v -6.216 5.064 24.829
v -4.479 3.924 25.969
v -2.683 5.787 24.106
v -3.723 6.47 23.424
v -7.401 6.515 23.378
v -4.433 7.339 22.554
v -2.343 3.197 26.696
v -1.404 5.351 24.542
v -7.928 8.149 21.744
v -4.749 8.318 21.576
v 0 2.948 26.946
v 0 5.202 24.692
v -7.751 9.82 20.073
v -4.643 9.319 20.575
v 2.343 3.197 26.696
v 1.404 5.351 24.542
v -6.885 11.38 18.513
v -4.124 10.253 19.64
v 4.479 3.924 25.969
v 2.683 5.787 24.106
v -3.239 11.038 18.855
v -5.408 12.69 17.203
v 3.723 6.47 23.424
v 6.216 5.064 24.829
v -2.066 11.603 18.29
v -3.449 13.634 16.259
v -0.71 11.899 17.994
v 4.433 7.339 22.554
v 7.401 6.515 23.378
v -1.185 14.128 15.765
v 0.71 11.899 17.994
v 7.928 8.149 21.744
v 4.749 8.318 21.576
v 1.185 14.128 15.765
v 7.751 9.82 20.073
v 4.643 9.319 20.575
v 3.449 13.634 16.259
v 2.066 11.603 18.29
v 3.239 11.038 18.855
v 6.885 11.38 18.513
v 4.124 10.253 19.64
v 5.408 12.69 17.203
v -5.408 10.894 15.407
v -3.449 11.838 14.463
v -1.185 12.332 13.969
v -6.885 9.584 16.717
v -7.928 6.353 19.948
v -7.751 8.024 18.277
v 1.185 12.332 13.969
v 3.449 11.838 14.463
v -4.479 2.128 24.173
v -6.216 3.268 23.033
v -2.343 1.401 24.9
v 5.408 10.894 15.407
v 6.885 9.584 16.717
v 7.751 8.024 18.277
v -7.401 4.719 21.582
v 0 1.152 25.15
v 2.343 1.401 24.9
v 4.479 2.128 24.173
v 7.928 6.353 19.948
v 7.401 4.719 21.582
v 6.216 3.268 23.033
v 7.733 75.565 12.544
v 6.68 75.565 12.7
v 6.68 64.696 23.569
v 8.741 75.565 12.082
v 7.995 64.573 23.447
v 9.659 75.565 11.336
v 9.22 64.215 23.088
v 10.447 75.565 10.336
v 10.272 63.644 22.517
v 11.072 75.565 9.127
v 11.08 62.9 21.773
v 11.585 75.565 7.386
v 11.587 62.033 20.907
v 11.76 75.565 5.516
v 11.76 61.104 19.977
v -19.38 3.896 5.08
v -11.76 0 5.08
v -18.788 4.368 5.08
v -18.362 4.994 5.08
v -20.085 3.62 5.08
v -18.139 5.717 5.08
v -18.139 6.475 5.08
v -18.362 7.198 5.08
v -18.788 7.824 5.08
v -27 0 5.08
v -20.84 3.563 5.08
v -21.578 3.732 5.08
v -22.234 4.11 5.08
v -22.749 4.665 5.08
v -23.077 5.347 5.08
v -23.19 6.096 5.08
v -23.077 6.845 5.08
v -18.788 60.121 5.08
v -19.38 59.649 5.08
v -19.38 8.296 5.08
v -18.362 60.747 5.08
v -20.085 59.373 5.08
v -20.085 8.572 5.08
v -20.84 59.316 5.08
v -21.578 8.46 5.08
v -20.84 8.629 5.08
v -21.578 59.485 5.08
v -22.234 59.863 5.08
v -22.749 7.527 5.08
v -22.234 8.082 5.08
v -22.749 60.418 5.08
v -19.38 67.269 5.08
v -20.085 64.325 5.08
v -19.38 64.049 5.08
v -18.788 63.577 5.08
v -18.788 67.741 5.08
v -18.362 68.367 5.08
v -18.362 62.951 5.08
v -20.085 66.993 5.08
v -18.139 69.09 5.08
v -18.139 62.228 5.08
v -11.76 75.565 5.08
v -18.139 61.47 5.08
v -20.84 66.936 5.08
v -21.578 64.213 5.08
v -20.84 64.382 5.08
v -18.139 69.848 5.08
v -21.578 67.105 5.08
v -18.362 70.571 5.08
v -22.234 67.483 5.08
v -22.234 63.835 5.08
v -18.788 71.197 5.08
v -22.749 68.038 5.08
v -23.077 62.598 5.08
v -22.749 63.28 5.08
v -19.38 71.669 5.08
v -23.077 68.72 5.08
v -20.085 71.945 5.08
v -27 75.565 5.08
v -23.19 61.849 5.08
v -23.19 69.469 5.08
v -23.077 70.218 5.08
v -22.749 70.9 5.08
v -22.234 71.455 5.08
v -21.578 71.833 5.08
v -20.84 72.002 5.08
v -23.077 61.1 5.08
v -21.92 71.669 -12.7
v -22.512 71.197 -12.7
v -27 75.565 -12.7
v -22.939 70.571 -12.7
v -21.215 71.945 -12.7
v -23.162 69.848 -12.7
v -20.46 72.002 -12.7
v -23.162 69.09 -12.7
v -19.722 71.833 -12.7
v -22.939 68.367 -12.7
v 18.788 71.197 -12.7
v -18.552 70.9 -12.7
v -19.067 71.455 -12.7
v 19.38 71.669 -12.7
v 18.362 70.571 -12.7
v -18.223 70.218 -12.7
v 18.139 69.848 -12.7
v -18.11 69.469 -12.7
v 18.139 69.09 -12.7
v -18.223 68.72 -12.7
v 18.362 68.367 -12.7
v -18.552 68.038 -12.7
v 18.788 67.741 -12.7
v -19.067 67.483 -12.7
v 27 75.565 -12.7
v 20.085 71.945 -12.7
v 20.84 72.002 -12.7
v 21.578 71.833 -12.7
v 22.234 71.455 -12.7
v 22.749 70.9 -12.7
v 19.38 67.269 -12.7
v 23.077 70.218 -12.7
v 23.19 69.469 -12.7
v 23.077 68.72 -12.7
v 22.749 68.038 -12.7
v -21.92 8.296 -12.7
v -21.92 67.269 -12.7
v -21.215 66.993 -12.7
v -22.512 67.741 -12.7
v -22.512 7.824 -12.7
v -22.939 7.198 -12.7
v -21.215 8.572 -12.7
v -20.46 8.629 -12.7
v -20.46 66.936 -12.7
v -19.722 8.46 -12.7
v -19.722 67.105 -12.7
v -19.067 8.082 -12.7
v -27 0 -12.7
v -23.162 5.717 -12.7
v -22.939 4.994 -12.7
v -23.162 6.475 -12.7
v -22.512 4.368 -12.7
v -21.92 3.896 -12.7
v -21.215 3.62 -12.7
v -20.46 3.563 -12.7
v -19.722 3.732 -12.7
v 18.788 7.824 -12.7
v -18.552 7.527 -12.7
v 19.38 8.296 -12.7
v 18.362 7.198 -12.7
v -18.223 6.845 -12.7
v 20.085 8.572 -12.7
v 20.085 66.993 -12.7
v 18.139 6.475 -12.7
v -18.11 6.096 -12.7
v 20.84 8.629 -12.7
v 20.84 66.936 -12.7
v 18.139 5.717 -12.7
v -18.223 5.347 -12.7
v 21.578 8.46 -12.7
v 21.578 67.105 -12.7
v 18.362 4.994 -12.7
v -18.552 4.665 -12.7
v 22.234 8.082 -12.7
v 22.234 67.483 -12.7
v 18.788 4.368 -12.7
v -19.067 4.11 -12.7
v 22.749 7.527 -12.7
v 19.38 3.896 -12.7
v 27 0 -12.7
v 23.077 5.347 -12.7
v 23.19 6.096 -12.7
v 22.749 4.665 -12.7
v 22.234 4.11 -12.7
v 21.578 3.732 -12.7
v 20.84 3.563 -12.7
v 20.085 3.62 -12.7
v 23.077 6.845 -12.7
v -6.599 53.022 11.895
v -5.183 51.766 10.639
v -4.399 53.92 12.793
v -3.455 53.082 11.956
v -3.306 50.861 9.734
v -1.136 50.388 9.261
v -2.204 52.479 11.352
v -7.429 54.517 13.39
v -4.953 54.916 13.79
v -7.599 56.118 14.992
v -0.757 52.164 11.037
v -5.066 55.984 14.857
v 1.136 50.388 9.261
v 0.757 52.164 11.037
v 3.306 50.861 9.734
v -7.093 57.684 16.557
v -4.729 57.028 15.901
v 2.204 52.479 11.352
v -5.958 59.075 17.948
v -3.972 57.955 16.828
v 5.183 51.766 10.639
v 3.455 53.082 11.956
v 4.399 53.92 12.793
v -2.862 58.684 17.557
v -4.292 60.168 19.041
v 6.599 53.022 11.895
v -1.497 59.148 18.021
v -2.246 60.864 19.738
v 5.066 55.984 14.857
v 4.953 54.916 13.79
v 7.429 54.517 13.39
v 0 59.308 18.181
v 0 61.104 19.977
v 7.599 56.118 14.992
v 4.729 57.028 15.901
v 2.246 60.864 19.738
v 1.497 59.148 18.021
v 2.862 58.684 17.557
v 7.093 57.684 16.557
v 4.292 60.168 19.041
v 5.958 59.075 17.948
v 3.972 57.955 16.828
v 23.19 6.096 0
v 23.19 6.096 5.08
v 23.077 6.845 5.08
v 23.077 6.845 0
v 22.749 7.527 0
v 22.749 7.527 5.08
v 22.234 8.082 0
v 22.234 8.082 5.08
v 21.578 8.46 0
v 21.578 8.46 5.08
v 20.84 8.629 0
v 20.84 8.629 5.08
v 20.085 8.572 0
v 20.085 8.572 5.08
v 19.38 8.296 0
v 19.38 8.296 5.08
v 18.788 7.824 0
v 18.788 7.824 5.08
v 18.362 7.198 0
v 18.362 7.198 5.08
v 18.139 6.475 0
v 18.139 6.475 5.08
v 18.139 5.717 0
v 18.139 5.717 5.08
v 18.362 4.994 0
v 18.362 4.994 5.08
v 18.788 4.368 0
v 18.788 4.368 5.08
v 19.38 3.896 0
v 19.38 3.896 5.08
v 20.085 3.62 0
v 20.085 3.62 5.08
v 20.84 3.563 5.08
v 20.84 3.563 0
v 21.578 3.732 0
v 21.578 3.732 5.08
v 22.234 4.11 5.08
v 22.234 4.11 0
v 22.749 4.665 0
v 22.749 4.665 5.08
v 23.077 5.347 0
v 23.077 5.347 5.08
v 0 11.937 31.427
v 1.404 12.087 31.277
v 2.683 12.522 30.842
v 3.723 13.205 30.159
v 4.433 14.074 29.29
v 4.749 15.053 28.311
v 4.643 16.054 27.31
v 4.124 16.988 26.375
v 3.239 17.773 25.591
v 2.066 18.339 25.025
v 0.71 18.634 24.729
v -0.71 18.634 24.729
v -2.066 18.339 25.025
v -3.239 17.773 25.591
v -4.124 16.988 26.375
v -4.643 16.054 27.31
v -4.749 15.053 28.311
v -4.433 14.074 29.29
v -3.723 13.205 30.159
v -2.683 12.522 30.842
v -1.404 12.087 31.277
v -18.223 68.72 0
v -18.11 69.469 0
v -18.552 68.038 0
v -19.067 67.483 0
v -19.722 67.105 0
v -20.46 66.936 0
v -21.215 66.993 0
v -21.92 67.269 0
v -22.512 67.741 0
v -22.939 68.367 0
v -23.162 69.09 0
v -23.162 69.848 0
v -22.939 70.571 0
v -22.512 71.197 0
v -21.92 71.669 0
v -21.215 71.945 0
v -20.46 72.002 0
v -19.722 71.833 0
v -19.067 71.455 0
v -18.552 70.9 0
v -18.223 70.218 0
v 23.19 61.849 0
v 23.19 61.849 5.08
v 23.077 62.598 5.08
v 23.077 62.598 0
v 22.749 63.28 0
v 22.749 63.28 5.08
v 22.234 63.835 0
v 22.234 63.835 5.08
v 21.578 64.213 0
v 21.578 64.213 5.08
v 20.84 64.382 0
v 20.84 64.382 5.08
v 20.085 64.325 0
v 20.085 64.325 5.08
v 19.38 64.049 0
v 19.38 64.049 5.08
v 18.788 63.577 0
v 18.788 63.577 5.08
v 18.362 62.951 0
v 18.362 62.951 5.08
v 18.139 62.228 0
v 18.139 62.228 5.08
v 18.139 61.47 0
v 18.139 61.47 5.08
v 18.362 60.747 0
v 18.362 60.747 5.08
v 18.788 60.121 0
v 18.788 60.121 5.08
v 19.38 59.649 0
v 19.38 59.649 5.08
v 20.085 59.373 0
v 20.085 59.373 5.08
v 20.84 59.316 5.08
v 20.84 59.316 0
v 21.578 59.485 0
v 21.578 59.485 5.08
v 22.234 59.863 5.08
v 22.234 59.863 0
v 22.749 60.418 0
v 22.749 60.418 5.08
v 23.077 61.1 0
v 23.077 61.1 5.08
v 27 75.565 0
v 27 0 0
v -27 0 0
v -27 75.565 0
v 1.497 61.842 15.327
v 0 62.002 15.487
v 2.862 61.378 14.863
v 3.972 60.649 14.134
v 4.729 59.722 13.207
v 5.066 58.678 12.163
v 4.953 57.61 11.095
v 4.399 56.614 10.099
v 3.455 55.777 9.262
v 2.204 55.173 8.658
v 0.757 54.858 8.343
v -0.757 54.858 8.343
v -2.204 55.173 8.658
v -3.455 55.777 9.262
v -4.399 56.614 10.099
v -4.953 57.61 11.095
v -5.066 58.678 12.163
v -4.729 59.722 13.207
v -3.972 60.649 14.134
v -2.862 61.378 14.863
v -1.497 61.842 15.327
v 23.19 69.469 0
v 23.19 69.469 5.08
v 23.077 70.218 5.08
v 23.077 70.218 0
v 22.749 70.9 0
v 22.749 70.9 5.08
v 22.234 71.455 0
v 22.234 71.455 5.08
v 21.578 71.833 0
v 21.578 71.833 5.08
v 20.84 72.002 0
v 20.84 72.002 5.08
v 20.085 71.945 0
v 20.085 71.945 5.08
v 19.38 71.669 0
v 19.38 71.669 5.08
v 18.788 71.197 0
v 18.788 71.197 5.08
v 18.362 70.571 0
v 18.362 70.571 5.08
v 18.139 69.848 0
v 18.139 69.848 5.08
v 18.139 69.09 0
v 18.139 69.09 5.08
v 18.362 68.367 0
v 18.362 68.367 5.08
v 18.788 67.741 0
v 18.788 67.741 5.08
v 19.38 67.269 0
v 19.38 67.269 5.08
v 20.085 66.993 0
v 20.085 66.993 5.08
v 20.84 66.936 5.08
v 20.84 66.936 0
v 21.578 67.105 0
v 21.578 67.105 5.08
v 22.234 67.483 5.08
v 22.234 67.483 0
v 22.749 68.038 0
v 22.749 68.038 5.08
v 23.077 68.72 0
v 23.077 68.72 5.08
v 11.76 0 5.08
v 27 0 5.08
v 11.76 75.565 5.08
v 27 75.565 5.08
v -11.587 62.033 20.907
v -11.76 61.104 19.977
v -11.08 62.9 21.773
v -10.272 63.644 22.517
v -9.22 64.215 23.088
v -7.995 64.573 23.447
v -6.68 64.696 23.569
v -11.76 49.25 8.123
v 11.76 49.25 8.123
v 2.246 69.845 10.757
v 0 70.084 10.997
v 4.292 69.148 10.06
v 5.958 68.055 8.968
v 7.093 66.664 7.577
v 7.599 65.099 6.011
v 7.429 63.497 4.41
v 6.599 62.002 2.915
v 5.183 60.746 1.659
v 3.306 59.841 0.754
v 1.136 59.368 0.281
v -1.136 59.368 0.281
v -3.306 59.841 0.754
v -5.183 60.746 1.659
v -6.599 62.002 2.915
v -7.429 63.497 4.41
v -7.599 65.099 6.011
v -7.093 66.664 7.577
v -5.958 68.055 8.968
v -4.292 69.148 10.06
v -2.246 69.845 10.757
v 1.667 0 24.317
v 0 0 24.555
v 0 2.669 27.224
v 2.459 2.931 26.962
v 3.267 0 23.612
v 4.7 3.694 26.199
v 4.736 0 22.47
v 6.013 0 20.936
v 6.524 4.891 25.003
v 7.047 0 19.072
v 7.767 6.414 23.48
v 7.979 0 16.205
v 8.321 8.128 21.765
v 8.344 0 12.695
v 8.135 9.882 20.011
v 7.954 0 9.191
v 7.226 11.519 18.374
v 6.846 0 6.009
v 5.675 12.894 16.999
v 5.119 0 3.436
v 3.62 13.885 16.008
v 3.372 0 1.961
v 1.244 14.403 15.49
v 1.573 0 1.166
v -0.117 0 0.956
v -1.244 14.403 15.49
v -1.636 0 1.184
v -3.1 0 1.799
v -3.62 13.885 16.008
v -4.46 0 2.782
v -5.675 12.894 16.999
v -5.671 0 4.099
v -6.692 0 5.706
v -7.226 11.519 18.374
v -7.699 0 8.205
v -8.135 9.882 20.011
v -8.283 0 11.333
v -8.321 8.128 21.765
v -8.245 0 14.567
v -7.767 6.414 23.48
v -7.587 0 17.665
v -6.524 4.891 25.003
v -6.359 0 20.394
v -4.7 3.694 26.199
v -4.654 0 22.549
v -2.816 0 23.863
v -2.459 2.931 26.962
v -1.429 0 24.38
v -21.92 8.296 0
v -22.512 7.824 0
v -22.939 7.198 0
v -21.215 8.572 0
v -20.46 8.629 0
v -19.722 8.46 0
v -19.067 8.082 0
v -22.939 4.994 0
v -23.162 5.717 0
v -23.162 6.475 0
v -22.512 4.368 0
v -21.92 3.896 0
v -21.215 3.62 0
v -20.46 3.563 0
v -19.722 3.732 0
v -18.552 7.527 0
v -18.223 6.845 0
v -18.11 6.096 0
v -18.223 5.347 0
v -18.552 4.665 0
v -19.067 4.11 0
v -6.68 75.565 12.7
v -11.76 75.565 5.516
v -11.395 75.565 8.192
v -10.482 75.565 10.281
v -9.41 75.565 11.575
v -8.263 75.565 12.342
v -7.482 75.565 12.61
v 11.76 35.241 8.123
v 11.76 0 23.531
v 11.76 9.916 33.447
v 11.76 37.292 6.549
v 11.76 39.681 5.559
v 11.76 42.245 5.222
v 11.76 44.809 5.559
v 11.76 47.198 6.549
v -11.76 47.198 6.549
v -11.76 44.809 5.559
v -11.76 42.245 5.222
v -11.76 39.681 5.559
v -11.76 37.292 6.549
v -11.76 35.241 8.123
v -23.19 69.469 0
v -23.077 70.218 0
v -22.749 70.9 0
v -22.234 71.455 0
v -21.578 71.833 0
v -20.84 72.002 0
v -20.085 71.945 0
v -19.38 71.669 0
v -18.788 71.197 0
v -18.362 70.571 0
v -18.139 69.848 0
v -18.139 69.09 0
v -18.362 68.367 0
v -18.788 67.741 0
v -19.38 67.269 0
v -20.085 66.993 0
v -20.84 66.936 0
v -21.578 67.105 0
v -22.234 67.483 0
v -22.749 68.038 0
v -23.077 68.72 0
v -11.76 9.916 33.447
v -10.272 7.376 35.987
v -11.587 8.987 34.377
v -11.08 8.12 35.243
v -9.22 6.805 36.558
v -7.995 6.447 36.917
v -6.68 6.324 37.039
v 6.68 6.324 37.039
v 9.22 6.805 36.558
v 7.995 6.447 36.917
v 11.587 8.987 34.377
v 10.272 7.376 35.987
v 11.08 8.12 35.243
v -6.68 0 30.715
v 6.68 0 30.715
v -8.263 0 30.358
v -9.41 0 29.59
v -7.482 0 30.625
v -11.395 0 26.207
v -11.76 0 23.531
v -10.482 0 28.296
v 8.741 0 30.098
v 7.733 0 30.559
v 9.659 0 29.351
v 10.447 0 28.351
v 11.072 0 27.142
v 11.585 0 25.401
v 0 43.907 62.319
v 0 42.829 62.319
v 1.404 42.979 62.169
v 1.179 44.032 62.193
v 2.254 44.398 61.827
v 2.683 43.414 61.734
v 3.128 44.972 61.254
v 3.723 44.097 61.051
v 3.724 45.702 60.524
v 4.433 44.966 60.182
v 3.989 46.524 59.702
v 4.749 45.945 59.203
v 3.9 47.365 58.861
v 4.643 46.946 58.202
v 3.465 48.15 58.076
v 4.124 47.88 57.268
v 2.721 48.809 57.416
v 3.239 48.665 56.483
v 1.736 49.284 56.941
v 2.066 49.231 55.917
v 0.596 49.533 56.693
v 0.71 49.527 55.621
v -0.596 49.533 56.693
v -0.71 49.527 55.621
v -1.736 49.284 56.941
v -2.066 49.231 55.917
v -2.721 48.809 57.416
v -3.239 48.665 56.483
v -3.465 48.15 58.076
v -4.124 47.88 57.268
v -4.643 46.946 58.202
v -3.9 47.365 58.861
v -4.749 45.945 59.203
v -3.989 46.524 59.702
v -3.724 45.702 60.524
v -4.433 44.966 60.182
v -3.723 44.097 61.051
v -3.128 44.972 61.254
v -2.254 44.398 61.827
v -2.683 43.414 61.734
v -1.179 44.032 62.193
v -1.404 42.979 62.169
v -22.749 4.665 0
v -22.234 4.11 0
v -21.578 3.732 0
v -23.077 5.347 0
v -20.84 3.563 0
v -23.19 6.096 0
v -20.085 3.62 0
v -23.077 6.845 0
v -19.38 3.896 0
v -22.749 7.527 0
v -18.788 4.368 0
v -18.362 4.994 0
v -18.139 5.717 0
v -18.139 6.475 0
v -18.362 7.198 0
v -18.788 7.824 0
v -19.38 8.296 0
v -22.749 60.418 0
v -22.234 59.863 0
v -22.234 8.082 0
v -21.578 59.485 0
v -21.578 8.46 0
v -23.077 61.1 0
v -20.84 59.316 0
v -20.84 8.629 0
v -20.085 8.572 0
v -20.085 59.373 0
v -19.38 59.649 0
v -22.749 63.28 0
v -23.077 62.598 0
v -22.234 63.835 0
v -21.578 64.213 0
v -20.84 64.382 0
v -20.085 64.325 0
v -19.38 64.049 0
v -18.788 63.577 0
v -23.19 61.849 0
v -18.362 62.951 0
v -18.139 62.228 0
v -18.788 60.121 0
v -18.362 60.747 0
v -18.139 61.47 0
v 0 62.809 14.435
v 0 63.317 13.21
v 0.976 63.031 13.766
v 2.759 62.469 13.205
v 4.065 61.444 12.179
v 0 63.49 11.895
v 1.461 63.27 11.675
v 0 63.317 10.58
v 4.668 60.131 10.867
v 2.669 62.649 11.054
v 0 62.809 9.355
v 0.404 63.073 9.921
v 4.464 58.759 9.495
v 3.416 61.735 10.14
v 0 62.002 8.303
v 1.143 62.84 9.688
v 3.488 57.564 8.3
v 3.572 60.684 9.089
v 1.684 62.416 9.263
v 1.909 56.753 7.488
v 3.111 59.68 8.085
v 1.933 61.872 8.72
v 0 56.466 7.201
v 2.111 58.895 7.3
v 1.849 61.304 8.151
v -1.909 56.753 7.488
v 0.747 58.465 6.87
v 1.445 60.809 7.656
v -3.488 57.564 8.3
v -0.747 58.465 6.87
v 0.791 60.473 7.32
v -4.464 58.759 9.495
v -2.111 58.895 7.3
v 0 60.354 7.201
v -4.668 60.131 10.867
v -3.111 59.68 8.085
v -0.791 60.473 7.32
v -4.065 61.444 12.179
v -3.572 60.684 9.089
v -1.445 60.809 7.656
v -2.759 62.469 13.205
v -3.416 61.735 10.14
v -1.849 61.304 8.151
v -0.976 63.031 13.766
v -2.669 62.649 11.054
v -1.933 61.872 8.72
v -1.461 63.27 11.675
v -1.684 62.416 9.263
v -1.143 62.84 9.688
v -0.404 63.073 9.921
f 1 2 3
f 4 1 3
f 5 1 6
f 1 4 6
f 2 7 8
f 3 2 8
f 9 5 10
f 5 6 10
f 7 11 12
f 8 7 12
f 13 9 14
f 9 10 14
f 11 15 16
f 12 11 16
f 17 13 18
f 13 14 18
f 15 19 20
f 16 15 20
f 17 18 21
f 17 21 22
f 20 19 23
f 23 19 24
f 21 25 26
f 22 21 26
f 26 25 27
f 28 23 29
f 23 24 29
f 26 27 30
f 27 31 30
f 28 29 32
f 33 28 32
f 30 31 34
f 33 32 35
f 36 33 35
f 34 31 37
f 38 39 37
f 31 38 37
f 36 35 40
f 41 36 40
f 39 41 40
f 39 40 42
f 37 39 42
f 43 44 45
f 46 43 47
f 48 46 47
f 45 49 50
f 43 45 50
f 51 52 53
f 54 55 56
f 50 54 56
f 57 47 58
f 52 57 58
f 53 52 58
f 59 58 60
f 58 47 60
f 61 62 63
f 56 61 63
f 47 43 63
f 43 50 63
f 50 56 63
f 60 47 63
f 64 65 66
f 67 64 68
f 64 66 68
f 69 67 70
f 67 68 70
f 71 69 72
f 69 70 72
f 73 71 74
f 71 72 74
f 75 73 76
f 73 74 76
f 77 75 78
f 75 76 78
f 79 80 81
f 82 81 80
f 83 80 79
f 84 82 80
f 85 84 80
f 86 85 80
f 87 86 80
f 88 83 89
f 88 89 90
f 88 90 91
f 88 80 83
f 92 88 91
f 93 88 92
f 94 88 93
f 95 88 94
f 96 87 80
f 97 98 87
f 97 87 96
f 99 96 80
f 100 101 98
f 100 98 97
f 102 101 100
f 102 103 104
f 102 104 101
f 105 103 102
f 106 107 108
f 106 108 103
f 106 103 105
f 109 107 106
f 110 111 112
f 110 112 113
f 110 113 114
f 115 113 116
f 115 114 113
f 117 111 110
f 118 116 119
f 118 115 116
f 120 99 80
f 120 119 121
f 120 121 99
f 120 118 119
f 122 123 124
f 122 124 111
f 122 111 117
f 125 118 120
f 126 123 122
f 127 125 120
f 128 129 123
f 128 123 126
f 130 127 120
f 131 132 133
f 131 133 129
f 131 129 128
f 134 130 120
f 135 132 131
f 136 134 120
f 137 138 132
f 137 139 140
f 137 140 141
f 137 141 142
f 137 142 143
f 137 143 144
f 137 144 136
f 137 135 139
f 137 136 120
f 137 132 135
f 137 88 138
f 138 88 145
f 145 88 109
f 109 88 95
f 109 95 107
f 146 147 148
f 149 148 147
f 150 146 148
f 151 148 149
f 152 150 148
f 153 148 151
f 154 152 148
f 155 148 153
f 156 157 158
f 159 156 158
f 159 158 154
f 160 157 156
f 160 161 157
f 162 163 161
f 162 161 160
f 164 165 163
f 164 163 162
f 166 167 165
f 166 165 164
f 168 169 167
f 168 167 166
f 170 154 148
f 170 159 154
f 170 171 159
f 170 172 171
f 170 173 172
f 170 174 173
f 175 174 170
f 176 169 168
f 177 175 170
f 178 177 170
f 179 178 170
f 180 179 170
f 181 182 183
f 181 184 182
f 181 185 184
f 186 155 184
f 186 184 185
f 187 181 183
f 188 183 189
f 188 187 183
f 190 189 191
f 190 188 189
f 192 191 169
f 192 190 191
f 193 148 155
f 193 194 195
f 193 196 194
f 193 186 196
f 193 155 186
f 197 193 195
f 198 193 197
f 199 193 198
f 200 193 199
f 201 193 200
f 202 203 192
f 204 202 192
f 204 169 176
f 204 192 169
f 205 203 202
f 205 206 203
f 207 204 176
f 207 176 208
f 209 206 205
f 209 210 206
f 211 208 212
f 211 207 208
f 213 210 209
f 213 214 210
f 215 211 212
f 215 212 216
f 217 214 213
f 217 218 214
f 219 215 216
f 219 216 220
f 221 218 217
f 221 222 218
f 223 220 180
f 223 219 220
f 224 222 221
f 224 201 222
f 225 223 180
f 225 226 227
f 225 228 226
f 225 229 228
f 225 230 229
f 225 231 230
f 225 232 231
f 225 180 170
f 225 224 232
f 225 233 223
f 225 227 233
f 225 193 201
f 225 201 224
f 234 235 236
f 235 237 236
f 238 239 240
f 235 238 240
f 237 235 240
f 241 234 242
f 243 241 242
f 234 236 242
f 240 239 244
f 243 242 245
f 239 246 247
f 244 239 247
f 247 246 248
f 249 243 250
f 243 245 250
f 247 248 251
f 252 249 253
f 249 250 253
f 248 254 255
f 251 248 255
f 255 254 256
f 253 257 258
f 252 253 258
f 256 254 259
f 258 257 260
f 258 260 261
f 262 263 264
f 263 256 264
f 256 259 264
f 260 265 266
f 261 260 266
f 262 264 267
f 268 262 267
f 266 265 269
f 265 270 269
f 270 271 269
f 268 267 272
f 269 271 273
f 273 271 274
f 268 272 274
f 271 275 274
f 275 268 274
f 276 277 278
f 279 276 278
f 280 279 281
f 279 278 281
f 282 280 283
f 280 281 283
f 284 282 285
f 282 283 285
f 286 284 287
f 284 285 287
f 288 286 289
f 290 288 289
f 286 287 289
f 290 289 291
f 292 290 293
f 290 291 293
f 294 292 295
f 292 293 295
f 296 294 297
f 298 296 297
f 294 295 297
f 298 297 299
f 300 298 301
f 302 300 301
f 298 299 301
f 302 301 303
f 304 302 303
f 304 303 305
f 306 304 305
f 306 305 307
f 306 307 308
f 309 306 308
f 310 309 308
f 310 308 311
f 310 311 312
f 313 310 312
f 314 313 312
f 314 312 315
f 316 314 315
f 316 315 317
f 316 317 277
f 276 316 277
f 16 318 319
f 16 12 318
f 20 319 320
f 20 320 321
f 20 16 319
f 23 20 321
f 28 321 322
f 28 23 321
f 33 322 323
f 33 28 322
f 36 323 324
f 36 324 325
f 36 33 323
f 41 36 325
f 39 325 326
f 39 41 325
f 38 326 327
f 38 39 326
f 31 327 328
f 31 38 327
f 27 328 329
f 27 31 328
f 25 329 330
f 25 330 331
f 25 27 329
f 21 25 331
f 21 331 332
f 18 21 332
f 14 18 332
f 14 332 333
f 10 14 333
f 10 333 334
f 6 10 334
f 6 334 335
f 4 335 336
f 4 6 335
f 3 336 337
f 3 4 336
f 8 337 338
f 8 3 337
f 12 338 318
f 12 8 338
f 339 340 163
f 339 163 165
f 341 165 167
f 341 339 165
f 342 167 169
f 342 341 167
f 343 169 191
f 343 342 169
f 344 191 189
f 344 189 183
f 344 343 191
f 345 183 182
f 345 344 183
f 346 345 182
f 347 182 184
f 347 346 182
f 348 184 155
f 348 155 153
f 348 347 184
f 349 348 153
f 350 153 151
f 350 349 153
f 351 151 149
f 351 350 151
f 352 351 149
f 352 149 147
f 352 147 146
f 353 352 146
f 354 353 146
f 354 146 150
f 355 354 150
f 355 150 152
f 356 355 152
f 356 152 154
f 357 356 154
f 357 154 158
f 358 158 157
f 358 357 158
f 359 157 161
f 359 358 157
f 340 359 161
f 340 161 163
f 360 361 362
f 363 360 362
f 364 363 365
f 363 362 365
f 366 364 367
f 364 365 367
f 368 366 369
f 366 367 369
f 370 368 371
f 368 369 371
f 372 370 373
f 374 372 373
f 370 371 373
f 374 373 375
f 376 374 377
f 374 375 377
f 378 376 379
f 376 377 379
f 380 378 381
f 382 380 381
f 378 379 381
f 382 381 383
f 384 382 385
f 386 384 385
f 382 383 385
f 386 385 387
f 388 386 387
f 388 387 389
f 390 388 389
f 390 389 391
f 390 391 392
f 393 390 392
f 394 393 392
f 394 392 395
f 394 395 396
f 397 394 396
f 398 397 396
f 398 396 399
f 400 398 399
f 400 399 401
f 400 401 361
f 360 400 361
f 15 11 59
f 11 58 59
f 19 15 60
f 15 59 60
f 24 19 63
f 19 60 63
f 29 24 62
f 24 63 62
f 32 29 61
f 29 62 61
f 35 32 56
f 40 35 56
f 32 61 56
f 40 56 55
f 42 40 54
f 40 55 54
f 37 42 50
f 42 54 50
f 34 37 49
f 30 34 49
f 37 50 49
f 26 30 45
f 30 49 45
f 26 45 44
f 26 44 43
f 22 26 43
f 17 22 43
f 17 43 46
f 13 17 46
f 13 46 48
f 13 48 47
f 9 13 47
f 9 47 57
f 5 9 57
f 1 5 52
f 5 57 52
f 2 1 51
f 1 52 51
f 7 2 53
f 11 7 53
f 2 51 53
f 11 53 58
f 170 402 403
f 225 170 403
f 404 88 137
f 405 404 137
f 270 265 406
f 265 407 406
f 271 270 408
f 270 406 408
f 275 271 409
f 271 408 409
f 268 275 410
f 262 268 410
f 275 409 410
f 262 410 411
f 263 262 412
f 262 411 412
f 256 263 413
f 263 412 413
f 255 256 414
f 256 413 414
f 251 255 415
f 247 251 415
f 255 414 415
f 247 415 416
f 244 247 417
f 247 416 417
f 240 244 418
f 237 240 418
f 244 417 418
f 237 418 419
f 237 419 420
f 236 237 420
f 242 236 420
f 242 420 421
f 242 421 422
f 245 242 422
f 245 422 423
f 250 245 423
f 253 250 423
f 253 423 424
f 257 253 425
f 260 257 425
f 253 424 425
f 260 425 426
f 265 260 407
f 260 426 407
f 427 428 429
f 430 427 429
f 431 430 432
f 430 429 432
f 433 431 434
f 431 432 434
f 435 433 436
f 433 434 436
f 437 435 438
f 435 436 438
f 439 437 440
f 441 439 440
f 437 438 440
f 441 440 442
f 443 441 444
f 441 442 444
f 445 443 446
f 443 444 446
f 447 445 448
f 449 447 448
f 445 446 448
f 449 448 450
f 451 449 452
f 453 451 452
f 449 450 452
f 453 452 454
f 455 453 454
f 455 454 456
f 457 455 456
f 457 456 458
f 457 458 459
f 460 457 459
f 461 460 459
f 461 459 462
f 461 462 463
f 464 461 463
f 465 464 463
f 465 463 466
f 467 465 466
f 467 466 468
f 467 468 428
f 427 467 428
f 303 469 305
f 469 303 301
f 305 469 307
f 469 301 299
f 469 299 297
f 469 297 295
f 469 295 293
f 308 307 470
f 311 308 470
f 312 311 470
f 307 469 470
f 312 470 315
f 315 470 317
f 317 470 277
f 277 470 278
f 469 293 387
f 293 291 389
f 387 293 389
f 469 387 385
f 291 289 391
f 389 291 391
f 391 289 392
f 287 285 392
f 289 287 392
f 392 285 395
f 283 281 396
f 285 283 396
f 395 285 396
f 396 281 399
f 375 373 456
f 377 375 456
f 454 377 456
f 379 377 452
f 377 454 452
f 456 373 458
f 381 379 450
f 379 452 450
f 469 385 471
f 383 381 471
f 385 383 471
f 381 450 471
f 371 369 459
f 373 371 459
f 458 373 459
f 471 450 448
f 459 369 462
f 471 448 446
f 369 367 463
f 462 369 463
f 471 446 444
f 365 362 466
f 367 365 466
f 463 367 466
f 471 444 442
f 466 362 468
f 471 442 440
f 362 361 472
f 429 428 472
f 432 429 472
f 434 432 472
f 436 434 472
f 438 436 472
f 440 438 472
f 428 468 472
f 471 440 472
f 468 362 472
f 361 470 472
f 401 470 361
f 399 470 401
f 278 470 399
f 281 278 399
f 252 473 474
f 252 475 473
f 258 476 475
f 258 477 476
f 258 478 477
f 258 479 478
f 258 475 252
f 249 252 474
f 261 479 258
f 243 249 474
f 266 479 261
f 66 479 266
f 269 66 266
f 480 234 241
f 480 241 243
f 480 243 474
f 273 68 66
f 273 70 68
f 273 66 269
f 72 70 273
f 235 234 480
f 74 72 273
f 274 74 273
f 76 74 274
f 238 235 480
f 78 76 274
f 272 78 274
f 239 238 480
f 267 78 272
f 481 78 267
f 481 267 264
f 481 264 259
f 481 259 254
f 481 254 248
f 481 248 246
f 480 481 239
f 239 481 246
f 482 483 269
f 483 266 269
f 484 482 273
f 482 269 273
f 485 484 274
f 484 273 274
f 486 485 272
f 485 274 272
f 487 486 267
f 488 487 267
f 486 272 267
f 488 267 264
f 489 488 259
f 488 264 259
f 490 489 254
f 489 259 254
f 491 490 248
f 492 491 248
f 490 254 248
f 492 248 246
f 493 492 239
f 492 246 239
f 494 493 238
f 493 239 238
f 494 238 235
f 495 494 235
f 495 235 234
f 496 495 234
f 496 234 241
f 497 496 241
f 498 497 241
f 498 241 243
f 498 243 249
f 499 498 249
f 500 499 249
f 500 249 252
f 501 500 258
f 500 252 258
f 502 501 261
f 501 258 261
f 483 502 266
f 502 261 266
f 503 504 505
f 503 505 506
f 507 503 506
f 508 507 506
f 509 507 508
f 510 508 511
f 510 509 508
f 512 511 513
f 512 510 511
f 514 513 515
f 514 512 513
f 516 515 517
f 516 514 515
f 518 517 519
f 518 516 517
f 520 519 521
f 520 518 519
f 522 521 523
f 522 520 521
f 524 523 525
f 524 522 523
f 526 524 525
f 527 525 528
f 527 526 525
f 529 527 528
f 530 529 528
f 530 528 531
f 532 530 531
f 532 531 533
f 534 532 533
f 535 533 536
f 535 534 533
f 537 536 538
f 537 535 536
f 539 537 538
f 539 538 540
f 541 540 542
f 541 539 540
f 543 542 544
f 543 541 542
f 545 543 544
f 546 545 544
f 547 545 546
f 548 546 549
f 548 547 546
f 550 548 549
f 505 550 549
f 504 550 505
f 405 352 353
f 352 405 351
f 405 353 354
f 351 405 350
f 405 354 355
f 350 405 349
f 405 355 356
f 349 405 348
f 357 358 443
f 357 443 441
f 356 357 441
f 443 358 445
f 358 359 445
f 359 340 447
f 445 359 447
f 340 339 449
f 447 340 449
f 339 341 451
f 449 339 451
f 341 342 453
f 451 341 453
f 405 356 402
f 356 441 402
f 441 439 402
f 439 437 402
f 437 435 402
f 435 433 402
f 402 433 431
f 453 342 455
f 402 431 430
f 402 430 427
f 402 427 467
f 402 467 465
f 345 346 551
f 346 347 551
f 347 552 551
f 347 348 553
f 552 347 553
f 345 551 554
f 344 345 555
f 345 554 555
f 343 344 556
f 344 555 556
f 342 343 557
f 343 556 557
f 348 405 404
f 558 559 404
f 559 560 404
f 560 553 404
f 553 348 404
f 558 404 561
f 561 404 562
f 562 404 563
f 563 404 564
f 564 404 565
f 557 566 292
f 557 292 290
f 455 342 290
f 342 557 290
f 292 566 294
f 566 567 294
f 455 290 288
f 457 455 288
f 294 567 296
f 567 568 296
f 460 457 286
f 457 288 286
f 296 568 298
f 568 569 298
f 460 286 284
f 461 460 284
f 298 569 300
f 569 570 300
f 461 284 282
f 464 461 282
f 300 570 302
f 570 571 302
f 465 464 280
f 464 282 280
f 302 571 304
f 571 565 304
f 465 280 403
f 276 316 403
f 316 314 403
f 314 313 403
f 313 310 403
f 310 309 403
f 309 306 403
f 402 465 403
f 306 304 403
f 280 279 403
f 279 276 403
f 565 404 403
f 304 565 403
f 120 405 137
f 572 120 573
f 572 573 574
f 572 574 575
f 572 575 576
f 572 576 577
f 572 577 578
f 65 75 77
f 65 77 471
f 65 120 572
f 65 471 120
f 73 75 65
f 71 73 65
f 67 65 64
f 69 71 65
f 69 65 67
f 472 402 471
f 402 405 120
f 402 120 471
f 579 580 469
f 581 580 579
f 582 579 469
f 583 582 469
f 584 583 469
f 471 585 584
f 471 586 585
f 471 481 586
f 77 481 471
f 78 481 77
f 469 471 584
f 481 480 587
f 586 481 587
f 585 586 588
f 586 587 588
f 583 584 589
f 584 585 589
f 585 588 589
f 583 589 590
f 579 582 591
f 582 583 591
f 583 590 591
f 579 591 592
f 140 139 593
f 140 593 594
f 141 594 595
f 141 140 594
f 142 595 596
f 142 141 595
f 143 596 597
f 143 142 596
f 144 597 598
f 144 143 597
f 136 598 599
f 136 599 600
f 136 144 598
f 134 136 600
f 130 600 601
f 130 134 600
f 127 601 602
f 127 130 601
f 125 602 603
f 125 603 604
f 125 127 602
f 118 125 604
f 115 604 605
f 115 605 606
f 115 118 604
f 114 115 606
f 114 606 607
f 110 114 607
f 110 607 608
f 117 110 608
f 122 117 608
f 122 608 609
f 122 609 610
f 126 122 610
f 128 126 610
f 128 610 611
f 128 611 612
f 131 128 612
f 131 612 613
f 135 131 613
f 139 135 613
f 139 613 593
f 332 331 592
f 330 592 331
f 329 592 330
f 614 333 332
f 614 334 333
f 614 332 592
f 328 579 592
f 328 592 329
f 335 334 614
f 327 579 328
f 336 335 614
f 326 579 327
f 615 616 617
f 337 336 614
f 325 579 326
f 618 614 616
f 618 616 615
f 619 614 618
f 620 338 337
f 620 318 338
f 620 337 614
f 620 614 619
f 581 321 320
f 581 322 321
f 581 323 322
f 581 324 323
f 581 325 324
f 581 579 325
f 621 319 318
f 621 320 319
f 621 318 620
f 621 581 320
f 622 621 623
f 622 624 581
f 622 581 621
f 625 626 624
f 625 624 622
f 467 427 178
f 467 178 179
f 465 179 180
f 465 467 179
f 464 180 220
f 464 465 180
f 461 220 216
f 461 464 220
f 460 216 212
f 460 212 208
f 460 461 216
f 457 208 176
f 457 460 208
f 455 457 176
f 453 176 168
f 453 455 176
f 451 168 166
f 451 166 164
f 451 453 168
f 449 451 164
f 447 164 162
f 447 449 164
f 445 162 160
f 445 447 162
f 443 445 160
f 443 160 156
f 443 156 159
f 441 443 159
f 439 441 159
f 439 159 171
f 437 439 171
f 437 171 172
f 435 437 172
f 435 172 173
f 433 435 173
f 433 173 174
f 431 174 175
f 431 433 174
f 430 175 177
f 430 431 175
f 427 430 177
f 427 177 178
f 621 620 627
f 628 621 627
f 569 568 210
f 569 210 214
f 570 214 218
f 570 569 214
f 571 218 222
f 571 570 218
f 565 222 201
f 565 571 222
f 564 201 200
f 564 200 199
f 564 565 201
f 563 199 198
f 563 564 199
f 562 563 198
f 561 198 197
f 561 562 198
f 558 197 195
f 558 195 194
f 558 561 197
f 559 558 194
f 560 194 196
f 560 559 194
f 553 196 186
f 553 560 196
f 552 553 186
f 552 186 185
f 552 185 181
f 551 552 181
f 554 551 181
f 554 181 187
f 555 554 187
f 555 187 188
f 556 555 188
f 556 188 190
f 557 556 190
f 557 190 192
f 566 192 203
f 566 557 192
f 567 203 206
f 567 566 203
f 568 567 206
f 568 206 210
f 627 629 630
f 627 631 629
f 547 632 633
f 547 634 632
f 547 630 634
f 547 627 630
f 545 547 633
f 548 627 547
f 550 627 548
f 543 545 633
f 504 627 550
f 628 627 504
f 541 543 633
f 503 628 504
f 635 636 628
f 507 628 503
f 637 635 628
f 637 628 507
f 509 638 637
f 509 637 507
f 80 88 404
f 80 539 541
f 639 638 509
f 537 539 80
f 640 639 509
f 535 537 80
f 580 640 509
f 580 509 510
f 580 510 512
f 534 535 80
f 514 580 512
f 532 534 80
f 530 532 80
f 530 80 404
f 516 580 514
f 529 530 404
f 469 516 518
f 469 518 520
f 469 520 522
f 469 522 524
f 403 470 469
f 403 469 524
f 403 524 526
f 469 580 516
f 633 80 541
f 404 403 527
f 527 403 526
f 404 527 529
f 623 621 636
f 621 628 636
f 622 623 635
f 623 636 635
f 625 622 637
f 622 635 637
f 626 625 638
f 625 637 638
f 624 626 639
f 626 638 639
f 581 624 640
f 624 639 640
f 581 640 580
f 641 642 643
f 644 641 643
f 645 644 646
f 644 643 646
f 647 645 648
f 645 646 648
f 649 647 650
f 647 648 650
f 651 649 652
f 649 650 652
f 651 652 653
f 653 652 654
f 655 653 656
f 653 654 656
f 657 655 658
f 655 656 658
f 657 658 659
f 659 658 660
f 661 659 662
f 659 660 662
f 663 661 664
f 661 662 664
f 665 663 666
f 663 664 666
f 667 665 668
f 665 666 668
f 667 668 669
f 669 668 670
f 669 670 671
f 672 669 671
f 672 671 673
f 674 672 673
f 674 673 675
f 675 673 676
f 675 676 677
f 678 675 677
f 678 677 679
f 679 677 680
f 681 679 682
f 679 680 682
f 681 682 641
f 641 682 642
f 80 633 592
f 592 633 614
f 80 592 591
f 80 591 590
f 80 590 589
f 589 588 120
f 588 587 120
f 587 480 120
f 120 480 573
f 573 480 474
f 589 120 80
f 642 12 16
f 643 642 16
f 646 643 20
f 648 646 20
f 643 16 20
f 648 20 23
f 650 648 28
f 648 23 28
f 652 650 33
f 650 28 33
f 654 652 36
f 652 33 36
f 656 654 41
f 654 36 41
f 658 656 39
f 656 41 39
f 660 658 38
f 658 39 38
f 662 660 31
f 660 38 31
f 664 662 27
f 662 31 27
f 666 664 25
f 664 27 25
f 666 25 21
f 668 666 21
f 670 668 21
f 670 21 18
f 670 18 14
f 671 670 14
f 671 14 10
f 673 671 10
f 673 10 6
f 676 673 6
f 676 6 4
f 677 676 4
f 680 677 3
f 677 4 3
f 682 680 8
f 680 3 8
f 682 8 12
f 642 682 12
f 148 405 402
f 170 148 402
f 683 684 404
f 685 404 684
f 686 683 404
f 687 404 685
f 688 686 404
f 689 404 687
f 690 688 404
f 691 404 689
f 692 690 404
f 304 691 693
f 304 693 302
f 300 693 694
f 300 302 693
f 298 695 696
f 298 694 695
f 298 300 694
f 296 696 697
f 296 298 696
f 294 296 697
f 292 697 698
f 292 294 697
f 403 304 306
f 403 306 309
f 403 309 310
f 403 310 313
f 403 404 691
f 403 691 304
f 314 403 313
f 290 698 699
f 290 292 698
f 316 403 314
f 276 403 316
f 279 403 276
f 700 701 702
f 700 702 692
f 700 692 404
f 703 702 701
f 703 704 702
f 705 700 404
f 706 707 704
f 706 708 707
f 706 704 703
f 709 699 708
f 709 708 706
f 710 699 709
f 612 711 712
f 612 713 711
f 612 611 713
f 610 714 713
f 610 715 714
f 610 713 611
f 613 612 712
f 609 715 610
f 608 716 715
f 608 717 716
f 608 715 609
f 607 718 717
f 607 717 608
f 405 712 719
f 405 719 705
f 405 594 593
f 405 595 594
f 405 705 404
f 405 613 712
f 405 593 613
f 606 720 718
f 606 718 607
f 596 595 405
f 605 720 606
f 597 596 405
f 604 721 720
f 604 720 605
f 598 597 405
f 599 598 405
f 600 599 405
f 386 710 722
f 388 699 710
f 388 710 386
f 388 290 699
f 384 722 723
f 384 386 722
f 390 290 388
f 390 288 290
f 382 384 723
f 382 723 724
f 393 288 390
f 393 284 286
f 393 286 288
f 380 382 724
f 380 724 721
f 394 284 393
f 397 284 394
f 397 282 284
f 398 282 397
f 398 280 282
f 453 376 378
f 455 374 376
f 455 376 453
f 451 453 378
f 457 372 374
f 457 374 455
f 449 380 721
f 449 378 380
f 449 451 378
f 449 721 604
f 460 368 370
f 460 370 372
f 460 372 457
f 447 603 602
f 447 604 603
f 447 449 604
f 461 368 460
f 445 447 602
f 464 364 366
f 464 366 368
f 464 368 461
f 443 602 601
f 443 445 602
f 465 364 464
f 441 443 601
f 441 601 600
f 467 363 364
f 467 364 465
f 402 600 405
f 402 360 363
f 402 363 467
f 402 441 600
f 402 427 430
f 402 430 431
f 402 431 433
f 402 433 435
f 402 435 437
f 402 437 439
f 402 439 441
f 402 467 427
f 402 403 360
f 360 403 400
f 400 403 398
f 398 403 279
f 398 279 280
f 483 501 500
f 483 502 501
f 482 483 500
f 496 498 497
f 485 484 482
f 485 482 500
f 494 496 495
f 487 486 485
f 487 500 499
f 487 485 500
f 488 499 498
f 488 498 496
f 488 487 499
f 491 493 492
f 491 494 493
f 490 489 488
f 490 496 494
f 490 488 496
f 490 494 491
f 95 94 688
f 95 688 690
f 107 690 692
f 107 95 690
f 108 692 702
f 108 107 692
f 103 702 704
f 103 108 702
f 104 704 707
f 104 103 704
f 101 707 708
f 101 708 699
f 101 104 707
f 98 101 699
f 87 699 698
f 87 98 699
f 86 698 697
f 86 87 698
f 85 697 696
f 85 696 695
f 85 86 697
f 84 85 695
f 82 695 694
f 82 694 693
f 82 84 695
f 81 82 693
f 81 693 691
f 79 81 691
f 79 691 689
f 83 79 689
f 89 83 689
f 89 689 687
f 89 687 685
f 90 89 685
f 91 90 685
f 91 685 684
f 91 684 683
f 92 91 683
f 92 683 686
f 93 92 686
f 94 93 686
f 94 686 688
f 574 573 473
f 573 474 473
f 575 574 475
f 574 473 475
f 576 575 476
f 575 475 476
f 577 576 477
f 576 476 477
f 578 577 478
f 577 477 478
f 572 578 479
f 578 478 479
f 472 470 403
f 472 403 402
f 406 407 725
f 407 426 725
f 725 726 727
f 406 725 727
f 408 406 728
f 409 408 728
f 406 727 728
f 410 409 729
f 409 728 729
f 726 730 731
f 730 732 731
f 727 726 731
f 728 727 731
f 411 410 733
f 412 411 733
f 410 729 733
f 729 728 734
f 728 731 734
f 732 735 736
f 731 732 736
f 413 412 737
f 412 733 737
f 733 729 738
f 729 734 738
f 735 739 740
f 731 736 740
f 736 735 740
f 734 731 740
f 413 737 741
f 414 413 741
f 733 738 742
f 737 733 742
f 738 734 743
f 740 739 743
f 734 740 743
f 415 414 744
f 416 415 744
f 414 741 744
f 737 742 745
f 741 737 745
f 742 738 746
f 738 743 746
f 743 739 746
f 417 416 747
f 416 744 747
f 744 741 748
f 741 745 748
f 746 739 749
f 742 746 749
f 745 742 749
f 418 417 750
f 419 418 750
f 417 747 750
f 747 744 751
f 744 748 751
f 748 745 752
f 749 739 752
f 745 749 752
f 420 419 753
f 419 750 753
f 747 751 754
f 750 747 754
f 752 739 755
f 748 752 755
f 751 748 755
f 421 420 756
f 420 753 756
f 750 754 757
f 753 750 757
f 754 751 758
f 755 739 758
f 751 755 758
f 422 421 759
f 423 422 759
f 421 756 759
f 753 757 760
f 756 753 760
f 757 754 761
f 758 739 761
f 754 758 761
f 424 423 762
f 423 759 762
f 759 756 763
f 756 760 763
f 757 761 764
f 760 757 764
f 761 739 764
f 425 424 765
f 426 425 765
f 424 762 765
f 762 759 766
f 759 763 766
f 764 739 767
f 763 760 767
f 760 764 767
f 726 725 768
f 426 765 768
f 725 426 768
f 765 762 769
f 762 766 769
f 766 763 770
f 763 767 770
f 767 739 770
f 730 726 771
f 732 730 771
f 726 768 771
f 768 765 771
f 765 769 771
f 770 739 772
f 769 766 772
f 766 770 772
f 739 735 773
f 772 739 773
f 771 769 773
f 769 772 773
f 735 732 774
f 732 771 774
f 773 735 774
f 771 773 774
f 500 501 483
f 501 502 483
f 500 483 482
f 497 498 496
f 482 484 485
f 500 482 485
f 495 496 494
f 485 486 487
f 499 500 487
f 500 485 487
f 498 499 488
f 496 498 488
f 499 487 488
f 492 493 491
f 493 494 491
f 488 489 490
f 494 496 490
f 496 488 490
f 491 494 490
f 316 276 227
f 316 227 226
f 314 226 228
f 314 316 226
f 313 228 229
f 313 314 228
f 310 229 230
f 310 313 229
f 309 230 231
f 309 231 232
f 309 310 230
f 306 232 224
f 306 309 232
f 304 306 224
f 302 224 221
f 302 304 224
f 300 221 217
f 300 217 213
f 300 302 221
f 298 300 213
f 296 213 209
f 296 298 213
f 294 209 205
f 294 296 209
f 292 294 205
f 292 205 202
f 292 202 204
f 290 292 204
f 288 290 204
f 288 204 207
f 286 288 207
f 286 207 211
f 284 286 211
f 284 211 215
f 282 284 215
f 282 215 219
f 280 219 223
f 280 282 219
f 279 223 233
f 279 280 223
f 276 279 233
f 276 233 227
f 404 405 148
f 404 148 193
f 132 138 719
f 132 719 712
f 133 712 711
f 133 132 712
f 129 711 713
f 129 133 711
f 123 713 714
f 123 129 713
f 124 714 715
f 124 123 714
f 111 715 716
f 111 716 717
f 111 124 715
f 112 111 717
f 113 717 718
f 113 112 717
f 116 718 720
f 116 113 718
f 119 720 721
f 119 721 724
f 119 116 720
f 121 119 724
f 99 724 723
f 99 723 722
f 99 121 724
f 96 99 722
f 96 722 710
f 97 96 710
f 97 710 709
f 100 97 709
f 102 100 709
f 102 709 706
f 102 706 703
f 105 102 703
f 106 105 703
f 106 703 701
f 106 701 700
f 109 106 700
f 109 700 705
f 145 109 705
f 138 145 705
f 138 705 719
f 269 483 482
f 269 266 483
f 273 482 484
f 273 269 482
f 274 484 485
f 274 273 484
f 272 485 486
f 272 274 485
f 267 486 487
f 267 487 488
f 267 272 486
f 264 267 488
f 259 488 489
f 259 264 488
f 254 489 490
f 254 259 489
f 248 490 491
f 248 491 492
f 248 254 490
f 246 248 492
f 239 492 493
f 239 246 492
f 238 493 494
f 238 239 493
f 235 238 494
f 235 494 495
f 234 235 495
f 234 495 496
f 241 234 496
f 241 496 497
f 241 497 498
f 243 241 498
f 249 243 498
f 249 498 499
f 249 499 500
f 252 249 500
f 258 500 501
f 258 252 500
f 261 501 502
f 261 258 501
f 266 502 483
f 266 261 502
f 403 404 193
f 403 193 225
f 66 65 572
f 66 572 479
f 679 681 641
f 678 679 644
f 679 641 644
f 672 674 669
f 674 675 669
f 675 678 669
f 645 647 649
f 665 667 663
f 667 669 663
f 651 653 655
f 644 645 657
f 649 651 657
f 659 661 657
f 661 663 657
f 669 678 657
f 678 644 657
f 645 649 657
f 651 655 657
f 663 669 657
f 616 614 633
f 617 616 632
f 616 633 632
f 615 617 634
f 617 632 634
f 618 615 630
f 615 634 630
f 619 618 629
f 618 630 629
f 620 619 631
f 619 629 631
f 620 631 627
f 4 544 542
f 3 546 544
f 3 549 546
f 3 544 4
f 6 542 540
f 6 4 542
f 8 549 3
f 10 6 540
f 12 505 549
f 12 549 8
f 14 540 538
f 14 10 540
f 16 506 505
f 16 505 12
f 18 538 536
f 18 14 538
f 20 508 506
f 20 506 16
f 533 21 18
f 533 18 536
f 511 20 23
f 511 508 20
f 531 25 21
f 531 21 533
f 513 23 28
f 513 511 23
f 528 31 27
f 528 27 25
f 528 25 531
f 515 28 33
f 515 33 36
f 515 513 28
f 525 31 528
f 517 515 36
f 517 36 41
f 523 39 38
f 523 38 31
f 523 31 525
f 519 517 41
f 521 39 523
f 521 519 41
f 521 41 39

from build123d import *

# Parameters (mm, degrees)
F1_DEPTH  = 27.0002
F2_R      = 9.906
F3_W      = 75.565
F3_H      = 31.9594877579
F4_DEPTH  = 15.24
F5_R      = 2.54
F6_DEPTH  = 5.081
F8_R      = 5.08
F15_SIZE  = 0.762
F20_W     = 54.0004
F20_H     = 75.565
F20_R     = 2.54
F21_DEPTH = 12.7


with BuildPart() as f1:
    # F0 (on Right) → F1 (new body)
    with BuildSketch(Plane.YZ):
        Polygon((0, 30.7152561211), (0, 0), (75.565, 0), (75.565, 12.7), (64.6958964237, 23.5691035763), (42.2452561211, 1.1184632736), (6.3242316368, 37.0394877579), align=None)
    extrude(amount=F1_DEPTH)

    # F2
    f2_edges = [f1.edges().sort_by_distance(p)[0] for p in [
        (13.5001, 42.245256, 1.118463),
    ]]
    fillet(f2_edges, radius=F2_R)

    # F3 (on face) → F4 (cut)
    with BuildSketch(Plane.YZ.offset(27.0002)):
        with Locations((37.7825, 21.0597438789)):
            Rectangle(F3_W, F3_H)
    extrude(amount=-F4_DEPTH, mode=Mode.SUBTRACT)

    # F5 (on face) → F6 (cut, through all)
    with BuildSketch(Plane.XY.offset(5.08)):
        with Locations((20.6502, 69.469)):
            Circle(F5_R)
        with Locations((20.6502, 61.849)):
            Circle(F5_R)
        with Locations((20.6502, 6.096)):
            Circle(F5_R)
    extrude(amount=-F6_DEPTH, mode=Mode.SUBTRACT)

    # F7: F1 across face


with BuildPart() as f1_1:
    add(f1.part)
    add(f1.part.mirror(Plane(origin=(0, 31.4337361572, 11.6287579026), x_dir=(0, 1, 0), z_dir=(-1, 0, 0))))

    # F8
    f8_edges = [f1_1.edges().sort_by_distance(p)[0] for p in [
        (-11.7602, 70.130448, 18.134552),
        (11.7602, 70.130448, 18.134552),
        (11.7602, 3.162116, 33.877372),
        (-11.7602, 3.162116, 33.877372),
    ]]
    fillet(f8_edges, radius=F8_R)

    # F9 (on Right) → F10 (revolve, cut)
    with BuildSketch(Plane.YZ):
        Polygon((15.3044877579, 28.0592316368), (11.9368917125, 31.4268276822), (5.2016996217, 24.6916355914), (2.6692673955, 27.2240678175), (-12.277400211, 12.277400211), (-6.3773719395, 6.3773719395), align=None)
    revolve(axis=Axis((0, 22.0396798487, 34.7944237276), (0, 0.7071067812, 0.7071067812)), mode=Mode.SUBTRACT)

    # F16 (on Right) → F17 (revolve, cut)
    with BuildSketch(Plane.YZ):
        Polygon((55.7156403027, 14.5888474552), (64.6958964237, 5.6085913341), (70.0840500964, 10.9967450068), (61.1037939753, 19.9770011278), align=None)
    revolve(axis=Axis((0, 46.7353841816, 23.5691035763), (0, 0.7071067812, -0.7071067812)), mode=Mode.SUBTRACT)


with BuildPart() as f12:
    # F11 (on Right) → F12 (revolve)
    with BuildSketch(Plane.YZ):
        Polygon((11.9368917125, 31.4268276822), (5.2016996217, 24.6916355914), (2.9476553353, 26.9456798778), (1.1516041111, 25.1496286536), (6.7732444428, 19.5279883218), (46.7353841816, 59.4901280605), (43.3677881362, 62.8577241059), align=None)
    revolve(axis=Axis((0, 26.7543143122, 39.5090581912), (0, 0.7071067812, 0.7071067812)))

    # F15
    f15_edges = [f12.edges().sort_by_distance(p)[0] for p in [
        (0, 50.10298, 56.122532),
    ]]
    chamfer(f15_edges, length=F15_SIZE)


with BuildPart() as f13:
    # F11 (on Right) → F13 (revolve)
    with BuildSketch(Plane.YZ):
        Polygon((11.9368917125, 31.4268276822), (5.2016996217, 24.6916355914), (2.9476553353, 26.9456798778), (1.1516041111, 25.1496286536), (6.7732444428, 19.5279883218), (46.7353841816, 59.4901280605), (43.3677881362, 62.8577241059), align=None)
    revolve(axis=Axis((0, 22.0396798487, 34.7944237276), (0, 0.7071067812, 0.7071067812)))


with BuildPart() as f19:
    # F18 (on Right) → F19 (revolve)
    with BuildSketch(Plane.YZ):
        with BuildLine():
            Line((64.6958964237, 5.6085913341), (70.0840500964, 10.9967450068))
            Line((70.0840500964, 10.9967450068), (61.1037939753, 19.9770011278))
            Line((61.1037939753, 19.9770011278), (59.3077427511, 18.1809499036))
            Line((59.3077427511, 18.1809499036), (62.0018195874, 15.4868730673))
            ThreePointArc((62.0018195874, 15.4868730673), (63.489717139, 11.8947706189), (62.0018195874, 8.3026681704))
            Line((62.0018195874, 8.3026681704), (64.6958964237, 5.6085913341))
        make_face()
    revolve(axis=Axis((0, 46.7353841816, 23.5691035763), (0, 0.7071067812, -0.7071067812)))


with BuildPart() as f21:
    # F20 (on face) → F21 (new body)
    with BuildSketch(Plane(origin=(0, 0, 0), x_dir=(1, 0, 0), z_dir=(0, 0, -1))):
        with Locations((0, -37.7825)):
            Rectangle(F20_W, F20_H)
        with Locations((-20.6502, -69.469)):
            Circle(F20_R, mode=Mode.SUBTRACT)
        with Locations((20.6502, -69.469)):
            Circle(F20_R, mode=Mode.SUBTRACT)
        with Locations((-20.6502, -6.096)):
            Circle(F20_R, mode=Mode.SUBTRACT)
        with Locations((20.6502, -6.096)):
            Circle(F20_R, mode=Mode.SUBTRACT)
    extrude(amount=F21_DEPTH)


solid = Compound([f1_1.part, f12.part, f19.part, f21.part])
